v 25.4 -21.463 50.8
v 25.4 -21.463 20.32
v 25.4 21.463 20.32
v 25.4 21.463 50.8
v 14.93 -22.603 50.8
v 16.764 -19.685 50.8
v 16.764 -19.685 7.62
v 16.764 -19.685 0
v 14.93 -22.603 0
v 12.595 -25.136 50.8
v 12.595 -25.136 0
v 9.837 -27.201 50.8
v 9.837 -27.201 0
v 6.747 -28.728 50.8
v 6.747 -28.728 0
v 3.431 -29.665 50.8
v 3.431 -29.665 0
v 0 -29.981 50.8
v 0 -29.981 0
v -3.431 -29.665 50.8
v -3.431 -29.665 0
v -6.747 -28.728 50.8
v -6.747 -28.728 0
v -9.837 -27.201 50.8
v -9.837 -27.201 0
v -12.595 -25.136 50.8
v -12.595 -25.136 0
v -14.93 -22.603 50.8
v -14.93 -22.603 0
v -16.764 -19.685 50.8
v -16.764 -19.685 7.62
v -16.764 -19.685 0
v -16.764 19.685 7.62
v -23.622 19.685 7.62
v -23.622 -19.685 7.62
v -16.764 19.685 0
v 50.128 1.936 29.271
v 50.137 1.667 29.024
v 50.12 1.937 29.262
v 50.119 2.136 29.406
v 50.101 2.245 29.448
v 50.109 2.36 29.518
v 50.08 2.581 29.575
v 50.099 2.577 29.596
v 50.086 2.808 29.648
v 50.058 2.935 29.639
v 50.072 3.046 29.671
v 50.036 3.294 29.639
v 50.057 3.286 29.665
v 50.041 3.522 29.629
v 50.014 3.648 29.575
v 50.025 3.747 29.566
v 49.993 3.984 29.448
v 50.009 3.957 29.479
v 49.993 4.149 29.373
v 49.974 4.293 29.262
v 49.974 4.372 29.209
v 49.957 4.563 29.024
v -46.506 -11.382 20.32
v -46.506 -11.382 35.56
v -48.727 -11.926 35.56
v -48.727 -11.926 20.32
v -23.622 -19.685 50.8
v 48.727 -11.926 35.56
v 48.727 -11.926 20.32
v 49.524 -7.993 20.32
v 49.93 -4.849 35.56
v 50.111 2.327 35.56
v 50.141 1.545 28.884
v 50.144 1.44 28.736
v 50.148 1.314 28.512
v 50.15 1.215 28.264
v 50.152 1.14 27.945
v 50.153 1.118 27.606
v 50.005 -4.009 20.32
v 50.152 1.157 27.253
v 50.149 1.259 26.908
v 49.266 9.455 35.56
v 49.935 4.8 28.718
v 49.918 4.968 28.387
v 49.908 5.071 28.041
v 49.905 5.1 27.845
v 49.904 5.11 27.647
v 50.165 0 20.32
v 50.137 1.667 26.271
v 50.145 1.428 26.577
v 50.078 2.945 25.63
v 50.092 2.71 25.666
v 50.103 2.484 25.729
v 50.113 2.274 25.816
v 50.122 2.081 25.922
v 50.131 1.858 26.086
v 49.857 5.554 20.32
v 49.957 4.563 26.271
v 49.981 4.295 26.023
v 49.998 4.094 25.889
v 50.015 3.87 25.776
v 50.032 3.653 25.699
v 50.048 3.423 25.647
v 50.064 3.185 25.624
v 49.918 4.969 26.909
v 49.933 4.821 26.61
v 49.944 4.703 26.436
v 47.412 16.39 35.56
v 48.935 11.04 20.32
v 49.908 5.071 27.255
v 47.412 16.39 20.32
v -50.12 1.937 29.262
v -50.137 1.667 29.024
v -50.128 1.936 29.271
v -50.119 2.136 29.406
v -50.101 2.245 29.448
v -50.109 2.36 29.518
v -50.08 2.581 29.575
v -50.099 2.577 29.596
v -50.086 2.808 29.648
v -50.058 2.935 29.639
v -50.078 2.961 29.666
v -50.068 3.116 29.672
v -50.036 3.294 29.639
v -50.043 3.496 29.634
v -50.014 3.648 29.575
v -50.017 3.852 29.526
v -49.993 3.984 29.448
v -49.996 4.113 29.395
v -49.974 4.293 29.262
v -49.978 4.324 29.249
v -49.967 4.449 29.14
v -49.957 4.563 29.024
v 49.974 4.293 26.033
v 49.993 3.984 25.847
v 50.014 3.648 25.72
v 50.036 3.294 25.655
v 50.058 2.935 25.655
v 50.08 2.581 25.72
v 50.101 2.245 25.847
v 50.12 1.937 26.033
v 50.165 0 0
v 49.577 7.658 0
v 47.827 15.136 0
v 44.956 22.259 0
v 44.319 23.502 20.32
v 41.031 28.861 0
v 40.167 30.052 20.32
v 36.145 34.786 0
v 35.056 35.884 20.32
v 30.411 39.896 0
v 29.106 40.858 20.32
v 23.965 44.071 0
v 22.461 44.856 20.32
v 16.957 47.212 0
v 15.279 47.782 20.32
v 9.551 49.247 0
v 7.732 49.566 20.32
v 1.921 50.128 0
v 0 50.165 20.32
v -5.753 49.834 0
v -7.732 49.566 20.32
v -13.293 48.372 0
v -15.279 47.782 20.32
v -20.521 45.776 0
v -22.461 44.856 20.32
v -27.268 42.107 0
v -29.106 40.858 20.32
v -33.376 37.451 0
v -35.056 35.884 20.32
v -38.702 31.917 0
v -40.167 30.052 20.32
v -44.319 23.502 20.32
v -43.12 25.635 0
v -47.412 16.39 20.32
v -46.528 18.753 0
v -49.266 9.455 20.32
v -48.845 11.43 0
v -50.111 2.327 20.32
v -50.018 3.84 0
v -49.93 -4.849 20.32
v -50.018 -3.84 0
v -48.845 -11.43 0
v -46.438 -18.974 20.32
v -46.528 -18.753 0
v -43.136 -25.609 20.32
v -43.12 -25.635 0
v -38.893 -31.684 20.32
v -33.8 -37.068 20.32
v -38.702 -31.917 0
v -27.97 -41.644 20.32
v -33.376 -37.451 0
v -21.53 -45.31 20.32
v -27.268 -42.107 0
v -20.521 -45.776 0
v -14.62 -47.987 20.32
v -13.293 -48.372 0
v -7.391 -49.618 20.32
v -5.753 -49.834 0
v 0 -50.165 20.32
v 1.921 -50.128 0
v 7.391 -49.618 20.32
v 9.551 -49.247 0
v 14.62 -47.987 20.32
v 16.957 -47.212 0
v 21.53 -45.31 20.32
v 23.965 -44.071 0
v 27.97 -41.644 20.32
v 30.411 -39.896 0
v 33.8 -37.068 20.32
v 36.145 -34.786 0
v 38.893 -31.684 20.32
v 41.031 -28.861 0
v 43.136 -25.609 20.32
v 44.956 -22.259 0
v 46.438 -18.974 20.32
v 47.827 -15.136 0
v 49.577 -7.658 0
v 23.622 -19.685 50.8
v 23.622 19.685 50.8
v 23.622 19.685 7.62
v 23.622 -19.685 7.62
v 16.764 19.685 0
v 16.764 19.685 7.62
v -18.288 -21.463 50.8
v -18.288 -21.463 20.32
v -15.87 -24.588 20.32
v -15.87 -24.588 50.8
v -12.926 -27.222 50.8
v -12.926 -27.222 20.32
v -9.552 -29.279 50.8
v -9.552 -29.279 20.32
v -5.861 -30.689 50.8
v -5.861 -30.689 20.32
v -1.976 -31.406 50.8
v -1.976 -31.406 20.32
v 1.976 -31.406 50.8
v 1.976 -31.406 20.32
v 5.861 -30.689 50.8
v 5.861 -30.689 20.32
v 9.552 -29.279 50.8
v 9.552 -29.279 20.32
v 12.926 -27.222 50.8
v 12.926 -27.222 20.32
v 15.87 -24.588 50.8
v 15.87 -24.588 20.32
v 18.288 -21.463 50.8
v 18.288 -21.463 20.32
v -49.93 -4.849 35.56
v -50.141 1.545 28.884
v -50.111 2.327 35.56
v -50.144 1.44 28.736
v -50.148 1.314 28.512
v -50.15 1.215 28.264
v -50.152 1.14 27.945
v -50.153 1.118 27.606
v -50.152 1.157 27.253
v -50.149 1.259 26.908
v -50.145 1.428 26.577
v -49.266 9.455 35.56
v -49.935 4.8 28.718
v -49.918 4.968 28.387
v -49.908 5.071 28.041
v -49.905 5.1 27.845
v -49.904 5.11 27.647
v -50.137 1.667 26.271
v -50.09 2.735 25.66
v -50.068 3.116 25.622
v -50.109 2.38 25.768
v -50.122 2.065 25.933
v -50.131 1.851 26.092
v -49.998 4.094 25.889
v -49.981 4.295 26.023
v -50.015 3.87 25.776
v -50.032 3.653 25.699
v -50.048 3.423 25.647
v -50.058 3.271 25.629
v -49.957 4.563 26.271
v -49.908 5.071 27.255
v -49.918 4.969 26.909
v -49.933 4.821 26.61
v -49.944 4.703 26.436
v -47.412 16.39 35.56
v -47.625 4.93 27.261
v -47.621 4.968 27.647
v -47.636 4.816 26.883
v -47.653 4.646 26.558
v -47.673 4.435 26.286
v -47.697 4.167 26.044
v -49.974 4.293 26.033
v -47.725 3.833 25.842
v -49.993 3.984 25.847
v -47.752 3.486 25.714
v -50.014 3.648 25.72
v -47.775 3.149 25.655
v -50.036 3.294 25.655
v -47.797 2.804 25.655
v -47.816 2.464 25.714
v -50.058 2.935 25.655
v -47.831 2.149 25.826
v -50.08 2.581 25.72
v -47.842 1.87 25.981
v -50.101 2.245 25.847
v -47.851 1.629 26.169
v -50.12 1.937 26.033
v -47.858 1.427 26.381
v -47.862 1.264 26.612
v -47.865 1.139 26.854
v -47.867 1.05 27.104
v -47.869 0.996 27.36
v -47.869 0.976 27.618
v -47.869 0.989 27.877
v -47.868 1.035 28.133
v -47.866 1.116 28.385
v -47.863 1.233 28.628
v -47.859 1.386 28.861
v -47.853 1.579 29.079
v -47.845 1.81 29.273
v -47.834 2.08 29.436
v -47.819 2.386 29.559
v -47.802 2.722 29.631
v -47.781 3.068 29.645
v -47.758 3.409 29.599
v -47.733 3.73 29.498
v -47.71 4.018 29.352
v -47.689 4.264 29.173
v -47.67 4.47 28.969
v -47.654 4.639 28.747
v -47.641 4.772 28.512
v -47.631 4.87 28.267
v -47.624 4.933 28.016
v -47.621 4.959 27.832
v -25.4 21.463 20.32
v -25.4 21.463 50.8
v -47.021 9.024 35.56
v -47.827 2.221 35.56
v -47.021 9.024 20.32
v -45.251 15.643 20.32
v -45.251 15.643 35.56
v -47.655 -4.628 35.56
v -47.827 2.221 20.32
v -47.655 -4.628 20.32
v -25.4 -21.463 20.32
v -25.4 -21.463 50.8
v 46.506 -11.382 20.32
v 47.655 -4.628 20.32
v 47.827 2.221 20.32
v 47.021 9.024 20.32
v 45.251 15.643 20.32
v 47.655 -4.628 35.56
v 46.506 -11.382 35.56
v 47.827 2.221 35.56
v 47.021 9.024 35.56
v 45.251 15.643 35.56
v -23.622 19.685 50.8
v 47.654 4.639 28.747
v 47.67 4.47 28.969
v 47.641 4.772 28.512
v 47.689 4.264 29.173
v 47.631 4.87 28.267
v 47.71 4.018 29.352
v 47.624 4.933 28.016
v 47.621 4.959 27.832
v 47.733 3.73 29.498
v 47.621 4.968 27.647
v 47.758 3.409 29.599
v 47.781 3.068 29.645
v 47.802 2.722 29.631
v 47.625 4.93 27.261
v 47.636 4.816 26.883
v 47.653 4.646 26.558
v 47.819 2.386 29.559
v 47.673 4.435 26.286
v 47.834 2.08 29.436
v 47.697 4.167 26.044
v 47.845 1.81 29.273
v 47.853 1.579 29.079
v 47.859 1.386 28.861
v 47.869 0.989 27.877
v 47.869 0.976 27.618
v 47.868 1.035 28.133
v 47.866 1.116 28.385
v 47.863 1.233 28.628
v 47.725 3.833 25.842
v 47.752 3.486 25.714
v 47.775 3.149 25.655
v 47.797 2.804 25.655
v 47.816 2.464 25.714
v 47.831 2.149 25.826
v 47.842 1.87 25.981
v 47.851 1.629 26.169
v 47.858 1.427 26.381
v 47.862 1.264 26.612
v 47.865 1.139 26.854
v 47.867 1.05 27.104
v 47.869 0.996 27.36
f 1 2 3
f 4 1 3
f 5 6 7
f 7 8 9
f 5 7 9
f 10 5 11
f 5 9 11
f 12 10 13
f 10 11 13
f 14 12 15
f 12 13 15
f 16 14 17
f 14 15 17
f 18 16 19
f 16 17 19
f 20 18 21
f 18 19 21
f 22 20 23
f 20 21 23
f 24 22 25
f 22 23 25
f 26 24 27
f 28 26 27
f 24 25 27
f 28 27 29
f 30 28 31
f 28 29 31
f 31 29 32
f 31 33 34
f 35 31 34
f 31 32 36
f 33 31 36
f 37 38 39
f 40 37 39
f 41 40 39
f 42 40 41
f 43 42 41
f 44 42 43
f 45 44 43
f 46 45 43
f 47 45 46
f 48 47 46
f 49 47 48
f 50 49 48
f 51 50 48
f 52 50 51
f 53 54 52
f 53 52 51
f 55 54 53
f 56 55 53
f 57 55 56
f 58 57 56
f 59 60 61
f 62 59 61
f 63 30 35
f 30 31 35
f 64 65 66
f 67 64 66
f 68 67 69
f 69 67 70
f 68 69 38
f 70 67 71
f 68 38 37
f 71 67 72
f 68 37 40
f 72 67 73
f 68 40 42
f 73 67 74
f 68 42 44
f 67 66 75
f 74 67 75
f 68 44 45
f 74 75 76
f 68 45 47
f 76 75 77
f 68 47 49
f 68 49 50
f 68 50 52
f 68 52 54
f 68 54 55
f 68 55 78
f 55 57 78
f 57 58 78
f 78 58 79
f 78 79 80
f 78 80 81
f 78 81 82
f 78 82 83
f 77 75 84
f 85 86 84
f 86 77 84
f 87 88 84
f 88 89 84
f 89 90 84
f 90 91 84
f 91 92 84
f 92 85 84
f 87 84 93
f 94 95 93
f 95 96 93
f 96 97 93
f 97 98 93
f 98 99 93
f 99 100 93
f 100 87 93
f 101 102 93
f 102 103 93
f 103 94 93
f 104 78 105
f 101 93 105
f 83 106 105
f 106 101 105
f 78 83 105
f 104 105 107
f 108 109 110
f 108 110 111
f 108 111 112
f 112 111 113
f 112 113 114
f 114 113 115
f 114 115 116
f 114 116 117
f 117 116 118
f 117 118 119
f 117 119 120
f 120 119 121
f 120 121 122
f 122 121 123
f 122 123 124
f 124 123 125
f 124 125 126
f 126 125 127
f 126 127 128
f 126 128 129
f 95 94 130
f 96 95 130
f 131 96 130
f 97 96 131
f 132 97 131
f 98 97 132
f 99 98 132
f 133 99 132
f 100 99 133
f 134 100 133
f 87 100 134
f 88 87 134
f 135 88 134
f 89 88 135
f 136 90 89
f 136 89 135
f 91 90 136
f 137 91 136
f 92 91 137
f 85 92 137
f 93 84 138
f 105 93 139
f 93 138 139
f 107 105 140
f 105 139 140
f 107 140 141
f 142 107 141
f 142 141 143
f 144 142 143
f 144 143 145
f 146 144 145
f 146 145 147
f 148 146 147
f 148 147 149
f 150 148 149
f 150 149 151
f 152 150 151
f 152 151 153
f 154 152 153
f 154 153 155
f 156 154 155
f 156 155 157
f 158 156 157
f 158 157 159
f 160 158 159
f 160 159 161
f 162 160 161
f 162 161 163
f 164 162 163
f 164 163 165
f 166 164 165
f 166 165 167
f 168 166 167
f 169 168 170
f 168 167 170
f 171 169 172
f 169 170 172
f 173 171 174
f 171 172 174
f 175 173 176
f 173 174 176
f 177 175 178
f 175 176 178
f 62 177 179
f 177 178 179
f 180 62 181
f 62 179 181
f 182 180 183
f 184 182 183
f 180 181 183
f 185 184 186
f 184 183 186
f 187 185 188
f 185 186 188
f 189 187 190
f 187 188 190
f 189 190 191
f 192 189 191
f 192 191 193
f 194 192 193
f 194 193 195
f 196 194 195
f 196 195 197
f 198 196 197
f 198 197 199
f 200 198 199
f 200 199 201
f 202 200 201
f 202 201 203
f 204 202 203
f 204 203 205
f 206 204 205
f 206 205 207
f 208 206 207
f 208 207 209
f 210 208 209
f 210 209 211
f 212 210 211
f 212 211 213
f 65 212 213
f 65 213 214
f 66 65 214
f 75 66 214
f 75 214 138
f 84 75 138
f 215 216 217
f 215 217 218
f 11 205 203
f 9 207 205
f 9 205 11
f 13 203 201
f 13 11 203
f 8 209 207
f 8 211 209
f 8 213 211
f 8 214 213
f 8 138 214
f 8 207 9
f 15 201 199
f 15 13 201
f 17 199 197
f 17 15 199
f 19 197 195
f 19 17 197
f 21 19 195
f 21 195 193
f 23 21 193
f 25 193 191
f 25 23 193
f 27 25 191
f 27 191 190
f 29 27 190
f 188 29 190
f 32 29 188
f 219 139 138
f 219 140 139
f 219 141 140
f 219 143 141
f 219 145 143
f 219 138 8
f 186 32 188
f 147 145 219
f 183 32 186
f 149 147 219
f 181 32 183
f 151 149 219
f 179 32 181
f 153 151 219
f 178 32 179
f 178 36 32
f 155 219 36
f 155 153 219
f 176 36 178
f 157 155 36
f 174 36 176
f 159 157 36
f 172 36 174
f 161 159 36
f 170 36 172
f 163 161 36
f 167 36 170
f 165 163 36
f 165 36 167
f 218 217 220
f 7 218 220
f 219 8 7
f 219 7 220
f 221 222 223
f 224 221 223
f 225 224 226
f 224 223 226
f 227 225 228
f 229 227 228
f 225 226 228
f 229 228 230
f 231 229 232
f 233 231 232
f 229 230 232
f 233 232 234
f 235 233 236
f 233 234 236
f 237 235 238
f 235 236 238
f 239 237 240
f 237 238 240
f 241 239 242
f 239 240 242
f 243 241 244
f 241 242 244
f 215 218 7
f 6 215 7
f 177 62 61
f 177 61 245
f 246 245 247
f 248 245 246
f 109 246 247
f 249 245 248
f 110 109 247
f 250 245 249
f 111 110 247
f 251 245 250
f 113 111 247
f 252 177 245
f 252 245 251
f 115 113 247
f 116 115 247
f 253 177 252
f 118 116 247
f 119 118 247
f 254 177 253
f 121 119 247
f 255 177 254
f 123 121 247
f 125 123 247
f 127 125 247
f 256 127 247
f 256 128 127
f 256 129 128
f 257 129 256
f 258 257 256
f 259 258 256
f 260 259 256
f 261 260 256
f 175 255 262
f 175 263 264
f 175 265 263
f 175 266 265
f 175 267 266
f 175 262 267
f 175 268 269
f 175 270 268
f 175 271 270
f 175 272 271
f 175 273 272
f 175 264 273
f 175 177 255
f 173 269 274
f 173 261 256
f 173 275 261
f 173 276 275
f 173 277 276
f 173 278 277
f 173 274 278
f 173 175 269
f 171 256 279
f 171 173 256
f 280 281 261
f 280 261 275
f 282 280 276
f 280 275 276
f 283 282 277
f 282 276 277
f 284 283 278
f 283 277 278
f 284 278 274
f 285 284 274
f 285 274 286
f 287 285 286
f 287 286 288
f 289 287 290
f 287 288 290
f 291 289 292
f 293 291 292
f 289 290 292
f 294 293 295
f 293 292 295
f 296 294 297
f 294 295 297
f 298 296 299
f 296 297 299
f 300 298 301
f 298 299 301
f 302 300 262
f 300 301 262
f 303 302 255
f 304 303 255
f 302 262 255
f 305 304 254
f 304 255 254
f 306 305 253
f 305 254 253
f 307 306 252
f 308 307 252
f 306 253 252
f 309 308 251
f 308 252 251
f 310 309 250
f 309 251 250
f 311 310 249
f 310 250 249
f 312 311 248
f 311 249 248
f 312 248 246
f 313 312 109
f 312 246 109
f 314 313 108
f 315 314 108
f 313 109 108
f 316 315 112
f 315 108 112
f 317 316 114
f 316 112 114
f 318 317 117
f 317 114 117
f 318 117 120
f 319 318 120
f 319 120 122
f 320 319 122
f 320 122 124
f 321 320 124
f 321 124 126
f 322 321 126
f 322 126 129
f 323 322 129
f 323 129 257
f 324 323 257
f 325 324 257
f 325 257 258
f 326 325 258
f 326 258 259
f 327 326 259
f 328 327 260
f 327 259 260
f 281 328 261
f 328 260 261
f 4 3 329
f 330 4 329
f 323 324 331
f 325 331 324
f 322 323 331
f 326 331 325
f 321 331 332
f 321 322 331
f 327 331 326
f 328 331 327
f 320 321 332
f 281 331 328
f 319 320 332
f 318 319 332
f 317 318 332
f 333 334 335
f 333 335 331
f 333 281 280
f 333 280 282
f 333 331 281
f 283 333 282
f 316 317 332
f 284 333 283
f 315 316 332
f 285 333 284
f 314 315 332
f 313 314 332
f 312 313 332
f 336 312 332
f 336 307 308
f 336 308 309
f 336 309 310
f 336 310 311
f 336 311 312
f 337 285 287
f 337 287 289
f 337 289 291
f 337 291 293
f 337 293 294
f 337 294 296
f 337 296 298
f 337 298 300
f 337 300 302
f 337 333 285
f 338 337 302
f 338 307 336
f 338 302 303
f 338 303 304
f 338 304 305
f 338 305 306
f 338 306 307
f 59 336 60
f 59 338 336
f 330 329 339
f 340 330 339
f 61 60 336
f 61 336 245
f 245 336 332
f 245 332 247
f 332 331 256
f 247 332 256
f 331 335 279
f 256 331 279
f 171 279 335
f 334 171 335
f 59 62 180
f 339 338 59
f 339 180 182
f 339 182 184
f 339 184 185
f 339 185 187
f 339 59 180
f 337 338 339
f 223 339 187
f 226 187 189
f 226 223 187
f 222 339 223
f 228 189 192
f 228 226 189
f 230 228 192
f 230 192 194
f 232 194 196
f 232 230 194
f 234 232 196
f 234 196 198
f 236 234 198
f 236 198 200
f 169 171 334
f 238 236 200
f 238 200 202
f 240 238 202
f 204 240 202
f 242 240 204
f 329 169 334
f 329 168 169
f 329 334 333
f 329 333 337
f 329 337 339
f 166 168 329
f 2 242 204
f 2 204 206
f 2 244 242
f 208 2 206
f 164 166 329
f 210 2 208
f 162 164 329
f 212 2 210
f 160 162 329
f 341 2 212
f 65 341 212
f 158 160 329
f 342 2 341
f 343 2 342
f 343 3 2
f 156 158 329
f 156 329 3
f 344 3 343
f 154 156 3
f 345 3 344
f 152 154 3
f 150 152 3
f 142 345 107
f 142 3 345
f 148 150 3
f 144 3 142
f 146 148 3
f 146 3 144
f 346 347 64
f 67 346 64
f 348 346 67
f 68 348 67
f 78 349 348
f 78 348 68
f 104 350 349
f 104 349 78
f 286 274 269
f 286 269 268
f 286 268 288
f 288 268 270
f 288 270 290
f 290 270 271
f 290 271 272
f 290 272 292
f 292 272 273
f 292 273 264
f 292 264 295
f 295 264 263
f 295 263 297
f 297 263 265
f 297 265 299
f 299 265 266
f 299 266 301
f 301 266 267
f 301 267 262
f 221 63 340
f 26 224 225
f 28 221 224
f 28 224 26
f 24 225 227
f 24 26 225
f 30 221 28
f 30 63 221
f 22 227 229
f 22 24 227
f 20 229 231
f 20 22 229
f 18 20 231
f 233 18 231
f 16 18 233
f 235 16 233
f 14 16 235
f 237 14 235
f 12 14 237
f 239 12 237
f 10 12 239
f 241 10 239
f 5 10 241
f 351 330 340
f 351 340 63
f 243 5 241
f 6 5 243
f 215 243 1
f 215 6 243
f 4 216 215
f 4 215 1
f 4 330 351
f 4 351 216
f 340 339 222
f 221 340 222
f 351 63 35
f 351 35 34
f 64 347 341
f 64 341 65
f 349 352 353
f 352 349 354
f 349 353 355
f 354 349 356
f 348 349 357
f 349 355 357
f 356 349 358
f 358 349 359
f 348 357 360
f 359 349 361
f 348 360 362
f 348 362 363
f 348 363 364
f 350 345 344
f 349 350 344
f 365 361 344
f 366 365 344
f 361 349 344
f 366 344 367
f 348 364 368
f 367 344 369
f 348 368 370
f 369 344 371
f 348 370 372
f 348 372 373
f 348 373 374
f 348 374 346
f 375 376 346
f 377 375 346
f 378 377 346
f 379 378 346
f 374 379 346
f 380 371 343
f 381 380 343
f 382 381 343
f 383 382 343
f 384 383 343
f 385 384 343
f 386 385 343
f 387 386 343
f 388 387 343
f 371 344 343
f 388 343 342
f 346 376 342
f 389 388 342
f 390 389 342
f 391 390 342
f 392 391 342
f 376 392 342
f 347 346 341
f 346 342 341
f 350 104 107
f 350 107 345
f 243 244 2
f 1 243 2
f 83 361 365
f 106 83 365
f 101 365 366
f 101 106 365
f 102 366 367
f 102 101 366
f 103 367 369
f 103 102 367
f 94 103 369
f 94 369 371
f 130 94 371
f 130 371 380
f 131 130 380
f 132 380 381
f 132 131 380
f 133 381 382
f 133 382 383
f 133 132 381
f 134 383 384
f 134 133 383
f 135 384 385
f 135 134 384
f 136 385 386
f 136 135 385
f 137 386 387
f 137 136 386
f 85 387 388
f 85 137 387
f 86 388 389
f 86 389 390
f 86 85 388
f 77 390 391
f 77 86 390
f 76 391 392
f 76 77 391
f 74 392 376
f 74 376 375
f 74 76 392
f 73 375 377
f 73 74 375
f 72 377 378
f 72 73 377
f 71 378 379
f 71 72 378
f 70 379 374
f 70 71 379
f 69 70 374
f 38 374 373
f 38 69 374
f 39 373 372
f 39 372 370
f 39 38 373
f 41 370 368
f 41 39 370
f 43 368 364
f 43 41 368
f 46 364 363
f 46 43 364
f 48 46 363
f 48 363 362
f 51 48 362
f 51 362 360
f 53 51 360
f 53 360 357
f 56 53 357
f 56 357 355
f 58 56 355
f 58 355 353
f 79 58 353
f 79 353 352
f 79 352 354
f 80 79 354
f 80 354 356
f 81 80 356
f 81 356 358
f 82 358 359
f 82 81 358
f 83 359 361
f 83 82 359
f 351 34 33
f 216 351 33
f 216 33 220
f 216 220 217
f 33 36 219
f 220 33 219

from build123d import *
from build123d.topology import SkipClean

# Parameters (mm, degrees)
SKETCH1_R           = 50.165
BOSS_EXTRUDE1_DEPTH = 20.32
SKETCH4_W           = 6.858
SKETCH4_H           = 39.37
BOSS_EXTRUDE3_DEPTH = 7.62
BOSS_EXTRUDE4_DEPTH = 30.48
BOSS_EXTRUDE5_DEPTH = 15.24


with BuildPart() as part:
    # Sketch1 → Boss-Extrude1 (new body)
    with BuildSketch(Plane.XY):
        Circle(SKETCH1_R)
        with BuildLine():
            Line((16.764, -19.685), (23.622, -19.685))
            Line((23.622, -19.685), (23.622, 19.685))
            Line((23.622, 19.685), (-23.622, 19.685))
            Line((-23.622, 19.685), (-23.622, -19.685))
            Line((-23.622, -19.685), (-16.764, -19.685))
            ThreePointArc((-16.764, -19.685), (0, -29.98053413), (16.764, -19.685))
        make_face(mode=Mode.SUBTRACT)
    extrude(amount=BOSS_EXTRUDE1_DEPTH)

    # Sketch4 → Boss-Extrude3 (add)
    with BuildSketch(Plane(origin=(0, 0, 0), x_dir=(-1, 0, 0), z_dir=(0, 0, -1))):
        with Locations((-20.193, 0)):
            Rectangle(SKETCH4_W, SKETCH4_H)
        with Locations((20.193, 0)):
            Rectangle(SKETCH4_W, SKETCH4_H)
    extrude(amount=-BOSS_EXTRUDE3_DEPTH)

    # Sketch5 → Boss-Extrude4 (add)
    with BuildSketch(Plane.XY.offset(20.32)):
        with BuildLine():
            ThreePointArc((-18.288, -21.463), (0, -31.496), (18.288, -21.463))
            Line((18.288, -21.463), (25.4, -21.463))
            Line((25.4, -21.463), (25.4, 21.463))
            Line((25.4, 21.463), (-25.4, 21.463))
            Line((-25.4, 21.463), (-25.4, -21.463))
            Line((-25.4, -21.463), (-18.288, -21.463))
        make_face()
        with BuildLine():
            Line((-16.764, -19.685), (-23.622, -19.685))
            Line((-23.622, -19.685), (-23.622, 19.685))
            Line((-23.622, 19.685), (23.622, 19.685))
            Line((23.622, 19.685), (23.622, -19.685))
            Line((23.622, -19.685), (16.764, -19.685))
            ThreePointArc((16.764, -19.685), (0, -29.98053413), (-16.764, -19.685))
        make_face(mode=Mode.SUBTRACT)
    extrude(amount=BOSS_EXTRUDE4_DEPTH)

    # Sketch6 → Boss-Extrude5 (add)
    with BuildSketch(Plane.XY.offset(20.32)):
        with BuildLine():
            Line((47.411991955, 16.389943375), (45.251445486, 15.64305988))
            ThreePointArc((45.251445486, 15.64305988), (47.827461768, 2.220932657), (46.506398035, -11.382160729))
            Line((46.506398035, -11.382160729), (48.726862662, -11.925606068))
            ThreePointArc((48.726862662, -11.925606068), (50.111001056, 2.326971882), (47.411991955, 16.389943375))
        make_face()
    boss_extrude5 = extrude(amount=BOSS_EXTRUDE5_DEPTH)

    # Sketch8 → Ø4.0mm Dowel Hole1 (revolve, cut)
    with BuildSketch(Plane(origin=(50.068129829, 3.116023177, 27.647369776), x_dir=(-0.062115482456496916, 0.9980689689791966, 0), z_dir=(0, 0, 1))):
        Polygon((0, 0), (0, 5.011721238), (2, 3.81), (2, 0.020977491), (2.025, 0), align=None)
    f_4_0mm_dowel_hole1 = revolve(axis=Axis((56.405867782, 3.510456491, 27.647369776), (-0.9980689689791966, -0.06211548245649691, 0)), mode=Mode.SUBTRACT)

    # Mirror1: Boss-Extrude5, Ø4.0mm Dowel Hole1 across plane
    with SkipClean():  # the faces are left unmerged after this step: merging them gives an invalid solid
        add(boss_extrude5.mirror(Plane(origin=(0, 0, 0), x_dir=(0, 0, 1), z_dir=(1, 0, 0))))
        add(f_4_0mm_dowel_hole1.mirror(Plane(origin=(0, 0, 0), x_dir=(0, 0, 1), z_dir=(1, 0, 0))), mode=Mode.SUBTRACT)


solid = part.part
